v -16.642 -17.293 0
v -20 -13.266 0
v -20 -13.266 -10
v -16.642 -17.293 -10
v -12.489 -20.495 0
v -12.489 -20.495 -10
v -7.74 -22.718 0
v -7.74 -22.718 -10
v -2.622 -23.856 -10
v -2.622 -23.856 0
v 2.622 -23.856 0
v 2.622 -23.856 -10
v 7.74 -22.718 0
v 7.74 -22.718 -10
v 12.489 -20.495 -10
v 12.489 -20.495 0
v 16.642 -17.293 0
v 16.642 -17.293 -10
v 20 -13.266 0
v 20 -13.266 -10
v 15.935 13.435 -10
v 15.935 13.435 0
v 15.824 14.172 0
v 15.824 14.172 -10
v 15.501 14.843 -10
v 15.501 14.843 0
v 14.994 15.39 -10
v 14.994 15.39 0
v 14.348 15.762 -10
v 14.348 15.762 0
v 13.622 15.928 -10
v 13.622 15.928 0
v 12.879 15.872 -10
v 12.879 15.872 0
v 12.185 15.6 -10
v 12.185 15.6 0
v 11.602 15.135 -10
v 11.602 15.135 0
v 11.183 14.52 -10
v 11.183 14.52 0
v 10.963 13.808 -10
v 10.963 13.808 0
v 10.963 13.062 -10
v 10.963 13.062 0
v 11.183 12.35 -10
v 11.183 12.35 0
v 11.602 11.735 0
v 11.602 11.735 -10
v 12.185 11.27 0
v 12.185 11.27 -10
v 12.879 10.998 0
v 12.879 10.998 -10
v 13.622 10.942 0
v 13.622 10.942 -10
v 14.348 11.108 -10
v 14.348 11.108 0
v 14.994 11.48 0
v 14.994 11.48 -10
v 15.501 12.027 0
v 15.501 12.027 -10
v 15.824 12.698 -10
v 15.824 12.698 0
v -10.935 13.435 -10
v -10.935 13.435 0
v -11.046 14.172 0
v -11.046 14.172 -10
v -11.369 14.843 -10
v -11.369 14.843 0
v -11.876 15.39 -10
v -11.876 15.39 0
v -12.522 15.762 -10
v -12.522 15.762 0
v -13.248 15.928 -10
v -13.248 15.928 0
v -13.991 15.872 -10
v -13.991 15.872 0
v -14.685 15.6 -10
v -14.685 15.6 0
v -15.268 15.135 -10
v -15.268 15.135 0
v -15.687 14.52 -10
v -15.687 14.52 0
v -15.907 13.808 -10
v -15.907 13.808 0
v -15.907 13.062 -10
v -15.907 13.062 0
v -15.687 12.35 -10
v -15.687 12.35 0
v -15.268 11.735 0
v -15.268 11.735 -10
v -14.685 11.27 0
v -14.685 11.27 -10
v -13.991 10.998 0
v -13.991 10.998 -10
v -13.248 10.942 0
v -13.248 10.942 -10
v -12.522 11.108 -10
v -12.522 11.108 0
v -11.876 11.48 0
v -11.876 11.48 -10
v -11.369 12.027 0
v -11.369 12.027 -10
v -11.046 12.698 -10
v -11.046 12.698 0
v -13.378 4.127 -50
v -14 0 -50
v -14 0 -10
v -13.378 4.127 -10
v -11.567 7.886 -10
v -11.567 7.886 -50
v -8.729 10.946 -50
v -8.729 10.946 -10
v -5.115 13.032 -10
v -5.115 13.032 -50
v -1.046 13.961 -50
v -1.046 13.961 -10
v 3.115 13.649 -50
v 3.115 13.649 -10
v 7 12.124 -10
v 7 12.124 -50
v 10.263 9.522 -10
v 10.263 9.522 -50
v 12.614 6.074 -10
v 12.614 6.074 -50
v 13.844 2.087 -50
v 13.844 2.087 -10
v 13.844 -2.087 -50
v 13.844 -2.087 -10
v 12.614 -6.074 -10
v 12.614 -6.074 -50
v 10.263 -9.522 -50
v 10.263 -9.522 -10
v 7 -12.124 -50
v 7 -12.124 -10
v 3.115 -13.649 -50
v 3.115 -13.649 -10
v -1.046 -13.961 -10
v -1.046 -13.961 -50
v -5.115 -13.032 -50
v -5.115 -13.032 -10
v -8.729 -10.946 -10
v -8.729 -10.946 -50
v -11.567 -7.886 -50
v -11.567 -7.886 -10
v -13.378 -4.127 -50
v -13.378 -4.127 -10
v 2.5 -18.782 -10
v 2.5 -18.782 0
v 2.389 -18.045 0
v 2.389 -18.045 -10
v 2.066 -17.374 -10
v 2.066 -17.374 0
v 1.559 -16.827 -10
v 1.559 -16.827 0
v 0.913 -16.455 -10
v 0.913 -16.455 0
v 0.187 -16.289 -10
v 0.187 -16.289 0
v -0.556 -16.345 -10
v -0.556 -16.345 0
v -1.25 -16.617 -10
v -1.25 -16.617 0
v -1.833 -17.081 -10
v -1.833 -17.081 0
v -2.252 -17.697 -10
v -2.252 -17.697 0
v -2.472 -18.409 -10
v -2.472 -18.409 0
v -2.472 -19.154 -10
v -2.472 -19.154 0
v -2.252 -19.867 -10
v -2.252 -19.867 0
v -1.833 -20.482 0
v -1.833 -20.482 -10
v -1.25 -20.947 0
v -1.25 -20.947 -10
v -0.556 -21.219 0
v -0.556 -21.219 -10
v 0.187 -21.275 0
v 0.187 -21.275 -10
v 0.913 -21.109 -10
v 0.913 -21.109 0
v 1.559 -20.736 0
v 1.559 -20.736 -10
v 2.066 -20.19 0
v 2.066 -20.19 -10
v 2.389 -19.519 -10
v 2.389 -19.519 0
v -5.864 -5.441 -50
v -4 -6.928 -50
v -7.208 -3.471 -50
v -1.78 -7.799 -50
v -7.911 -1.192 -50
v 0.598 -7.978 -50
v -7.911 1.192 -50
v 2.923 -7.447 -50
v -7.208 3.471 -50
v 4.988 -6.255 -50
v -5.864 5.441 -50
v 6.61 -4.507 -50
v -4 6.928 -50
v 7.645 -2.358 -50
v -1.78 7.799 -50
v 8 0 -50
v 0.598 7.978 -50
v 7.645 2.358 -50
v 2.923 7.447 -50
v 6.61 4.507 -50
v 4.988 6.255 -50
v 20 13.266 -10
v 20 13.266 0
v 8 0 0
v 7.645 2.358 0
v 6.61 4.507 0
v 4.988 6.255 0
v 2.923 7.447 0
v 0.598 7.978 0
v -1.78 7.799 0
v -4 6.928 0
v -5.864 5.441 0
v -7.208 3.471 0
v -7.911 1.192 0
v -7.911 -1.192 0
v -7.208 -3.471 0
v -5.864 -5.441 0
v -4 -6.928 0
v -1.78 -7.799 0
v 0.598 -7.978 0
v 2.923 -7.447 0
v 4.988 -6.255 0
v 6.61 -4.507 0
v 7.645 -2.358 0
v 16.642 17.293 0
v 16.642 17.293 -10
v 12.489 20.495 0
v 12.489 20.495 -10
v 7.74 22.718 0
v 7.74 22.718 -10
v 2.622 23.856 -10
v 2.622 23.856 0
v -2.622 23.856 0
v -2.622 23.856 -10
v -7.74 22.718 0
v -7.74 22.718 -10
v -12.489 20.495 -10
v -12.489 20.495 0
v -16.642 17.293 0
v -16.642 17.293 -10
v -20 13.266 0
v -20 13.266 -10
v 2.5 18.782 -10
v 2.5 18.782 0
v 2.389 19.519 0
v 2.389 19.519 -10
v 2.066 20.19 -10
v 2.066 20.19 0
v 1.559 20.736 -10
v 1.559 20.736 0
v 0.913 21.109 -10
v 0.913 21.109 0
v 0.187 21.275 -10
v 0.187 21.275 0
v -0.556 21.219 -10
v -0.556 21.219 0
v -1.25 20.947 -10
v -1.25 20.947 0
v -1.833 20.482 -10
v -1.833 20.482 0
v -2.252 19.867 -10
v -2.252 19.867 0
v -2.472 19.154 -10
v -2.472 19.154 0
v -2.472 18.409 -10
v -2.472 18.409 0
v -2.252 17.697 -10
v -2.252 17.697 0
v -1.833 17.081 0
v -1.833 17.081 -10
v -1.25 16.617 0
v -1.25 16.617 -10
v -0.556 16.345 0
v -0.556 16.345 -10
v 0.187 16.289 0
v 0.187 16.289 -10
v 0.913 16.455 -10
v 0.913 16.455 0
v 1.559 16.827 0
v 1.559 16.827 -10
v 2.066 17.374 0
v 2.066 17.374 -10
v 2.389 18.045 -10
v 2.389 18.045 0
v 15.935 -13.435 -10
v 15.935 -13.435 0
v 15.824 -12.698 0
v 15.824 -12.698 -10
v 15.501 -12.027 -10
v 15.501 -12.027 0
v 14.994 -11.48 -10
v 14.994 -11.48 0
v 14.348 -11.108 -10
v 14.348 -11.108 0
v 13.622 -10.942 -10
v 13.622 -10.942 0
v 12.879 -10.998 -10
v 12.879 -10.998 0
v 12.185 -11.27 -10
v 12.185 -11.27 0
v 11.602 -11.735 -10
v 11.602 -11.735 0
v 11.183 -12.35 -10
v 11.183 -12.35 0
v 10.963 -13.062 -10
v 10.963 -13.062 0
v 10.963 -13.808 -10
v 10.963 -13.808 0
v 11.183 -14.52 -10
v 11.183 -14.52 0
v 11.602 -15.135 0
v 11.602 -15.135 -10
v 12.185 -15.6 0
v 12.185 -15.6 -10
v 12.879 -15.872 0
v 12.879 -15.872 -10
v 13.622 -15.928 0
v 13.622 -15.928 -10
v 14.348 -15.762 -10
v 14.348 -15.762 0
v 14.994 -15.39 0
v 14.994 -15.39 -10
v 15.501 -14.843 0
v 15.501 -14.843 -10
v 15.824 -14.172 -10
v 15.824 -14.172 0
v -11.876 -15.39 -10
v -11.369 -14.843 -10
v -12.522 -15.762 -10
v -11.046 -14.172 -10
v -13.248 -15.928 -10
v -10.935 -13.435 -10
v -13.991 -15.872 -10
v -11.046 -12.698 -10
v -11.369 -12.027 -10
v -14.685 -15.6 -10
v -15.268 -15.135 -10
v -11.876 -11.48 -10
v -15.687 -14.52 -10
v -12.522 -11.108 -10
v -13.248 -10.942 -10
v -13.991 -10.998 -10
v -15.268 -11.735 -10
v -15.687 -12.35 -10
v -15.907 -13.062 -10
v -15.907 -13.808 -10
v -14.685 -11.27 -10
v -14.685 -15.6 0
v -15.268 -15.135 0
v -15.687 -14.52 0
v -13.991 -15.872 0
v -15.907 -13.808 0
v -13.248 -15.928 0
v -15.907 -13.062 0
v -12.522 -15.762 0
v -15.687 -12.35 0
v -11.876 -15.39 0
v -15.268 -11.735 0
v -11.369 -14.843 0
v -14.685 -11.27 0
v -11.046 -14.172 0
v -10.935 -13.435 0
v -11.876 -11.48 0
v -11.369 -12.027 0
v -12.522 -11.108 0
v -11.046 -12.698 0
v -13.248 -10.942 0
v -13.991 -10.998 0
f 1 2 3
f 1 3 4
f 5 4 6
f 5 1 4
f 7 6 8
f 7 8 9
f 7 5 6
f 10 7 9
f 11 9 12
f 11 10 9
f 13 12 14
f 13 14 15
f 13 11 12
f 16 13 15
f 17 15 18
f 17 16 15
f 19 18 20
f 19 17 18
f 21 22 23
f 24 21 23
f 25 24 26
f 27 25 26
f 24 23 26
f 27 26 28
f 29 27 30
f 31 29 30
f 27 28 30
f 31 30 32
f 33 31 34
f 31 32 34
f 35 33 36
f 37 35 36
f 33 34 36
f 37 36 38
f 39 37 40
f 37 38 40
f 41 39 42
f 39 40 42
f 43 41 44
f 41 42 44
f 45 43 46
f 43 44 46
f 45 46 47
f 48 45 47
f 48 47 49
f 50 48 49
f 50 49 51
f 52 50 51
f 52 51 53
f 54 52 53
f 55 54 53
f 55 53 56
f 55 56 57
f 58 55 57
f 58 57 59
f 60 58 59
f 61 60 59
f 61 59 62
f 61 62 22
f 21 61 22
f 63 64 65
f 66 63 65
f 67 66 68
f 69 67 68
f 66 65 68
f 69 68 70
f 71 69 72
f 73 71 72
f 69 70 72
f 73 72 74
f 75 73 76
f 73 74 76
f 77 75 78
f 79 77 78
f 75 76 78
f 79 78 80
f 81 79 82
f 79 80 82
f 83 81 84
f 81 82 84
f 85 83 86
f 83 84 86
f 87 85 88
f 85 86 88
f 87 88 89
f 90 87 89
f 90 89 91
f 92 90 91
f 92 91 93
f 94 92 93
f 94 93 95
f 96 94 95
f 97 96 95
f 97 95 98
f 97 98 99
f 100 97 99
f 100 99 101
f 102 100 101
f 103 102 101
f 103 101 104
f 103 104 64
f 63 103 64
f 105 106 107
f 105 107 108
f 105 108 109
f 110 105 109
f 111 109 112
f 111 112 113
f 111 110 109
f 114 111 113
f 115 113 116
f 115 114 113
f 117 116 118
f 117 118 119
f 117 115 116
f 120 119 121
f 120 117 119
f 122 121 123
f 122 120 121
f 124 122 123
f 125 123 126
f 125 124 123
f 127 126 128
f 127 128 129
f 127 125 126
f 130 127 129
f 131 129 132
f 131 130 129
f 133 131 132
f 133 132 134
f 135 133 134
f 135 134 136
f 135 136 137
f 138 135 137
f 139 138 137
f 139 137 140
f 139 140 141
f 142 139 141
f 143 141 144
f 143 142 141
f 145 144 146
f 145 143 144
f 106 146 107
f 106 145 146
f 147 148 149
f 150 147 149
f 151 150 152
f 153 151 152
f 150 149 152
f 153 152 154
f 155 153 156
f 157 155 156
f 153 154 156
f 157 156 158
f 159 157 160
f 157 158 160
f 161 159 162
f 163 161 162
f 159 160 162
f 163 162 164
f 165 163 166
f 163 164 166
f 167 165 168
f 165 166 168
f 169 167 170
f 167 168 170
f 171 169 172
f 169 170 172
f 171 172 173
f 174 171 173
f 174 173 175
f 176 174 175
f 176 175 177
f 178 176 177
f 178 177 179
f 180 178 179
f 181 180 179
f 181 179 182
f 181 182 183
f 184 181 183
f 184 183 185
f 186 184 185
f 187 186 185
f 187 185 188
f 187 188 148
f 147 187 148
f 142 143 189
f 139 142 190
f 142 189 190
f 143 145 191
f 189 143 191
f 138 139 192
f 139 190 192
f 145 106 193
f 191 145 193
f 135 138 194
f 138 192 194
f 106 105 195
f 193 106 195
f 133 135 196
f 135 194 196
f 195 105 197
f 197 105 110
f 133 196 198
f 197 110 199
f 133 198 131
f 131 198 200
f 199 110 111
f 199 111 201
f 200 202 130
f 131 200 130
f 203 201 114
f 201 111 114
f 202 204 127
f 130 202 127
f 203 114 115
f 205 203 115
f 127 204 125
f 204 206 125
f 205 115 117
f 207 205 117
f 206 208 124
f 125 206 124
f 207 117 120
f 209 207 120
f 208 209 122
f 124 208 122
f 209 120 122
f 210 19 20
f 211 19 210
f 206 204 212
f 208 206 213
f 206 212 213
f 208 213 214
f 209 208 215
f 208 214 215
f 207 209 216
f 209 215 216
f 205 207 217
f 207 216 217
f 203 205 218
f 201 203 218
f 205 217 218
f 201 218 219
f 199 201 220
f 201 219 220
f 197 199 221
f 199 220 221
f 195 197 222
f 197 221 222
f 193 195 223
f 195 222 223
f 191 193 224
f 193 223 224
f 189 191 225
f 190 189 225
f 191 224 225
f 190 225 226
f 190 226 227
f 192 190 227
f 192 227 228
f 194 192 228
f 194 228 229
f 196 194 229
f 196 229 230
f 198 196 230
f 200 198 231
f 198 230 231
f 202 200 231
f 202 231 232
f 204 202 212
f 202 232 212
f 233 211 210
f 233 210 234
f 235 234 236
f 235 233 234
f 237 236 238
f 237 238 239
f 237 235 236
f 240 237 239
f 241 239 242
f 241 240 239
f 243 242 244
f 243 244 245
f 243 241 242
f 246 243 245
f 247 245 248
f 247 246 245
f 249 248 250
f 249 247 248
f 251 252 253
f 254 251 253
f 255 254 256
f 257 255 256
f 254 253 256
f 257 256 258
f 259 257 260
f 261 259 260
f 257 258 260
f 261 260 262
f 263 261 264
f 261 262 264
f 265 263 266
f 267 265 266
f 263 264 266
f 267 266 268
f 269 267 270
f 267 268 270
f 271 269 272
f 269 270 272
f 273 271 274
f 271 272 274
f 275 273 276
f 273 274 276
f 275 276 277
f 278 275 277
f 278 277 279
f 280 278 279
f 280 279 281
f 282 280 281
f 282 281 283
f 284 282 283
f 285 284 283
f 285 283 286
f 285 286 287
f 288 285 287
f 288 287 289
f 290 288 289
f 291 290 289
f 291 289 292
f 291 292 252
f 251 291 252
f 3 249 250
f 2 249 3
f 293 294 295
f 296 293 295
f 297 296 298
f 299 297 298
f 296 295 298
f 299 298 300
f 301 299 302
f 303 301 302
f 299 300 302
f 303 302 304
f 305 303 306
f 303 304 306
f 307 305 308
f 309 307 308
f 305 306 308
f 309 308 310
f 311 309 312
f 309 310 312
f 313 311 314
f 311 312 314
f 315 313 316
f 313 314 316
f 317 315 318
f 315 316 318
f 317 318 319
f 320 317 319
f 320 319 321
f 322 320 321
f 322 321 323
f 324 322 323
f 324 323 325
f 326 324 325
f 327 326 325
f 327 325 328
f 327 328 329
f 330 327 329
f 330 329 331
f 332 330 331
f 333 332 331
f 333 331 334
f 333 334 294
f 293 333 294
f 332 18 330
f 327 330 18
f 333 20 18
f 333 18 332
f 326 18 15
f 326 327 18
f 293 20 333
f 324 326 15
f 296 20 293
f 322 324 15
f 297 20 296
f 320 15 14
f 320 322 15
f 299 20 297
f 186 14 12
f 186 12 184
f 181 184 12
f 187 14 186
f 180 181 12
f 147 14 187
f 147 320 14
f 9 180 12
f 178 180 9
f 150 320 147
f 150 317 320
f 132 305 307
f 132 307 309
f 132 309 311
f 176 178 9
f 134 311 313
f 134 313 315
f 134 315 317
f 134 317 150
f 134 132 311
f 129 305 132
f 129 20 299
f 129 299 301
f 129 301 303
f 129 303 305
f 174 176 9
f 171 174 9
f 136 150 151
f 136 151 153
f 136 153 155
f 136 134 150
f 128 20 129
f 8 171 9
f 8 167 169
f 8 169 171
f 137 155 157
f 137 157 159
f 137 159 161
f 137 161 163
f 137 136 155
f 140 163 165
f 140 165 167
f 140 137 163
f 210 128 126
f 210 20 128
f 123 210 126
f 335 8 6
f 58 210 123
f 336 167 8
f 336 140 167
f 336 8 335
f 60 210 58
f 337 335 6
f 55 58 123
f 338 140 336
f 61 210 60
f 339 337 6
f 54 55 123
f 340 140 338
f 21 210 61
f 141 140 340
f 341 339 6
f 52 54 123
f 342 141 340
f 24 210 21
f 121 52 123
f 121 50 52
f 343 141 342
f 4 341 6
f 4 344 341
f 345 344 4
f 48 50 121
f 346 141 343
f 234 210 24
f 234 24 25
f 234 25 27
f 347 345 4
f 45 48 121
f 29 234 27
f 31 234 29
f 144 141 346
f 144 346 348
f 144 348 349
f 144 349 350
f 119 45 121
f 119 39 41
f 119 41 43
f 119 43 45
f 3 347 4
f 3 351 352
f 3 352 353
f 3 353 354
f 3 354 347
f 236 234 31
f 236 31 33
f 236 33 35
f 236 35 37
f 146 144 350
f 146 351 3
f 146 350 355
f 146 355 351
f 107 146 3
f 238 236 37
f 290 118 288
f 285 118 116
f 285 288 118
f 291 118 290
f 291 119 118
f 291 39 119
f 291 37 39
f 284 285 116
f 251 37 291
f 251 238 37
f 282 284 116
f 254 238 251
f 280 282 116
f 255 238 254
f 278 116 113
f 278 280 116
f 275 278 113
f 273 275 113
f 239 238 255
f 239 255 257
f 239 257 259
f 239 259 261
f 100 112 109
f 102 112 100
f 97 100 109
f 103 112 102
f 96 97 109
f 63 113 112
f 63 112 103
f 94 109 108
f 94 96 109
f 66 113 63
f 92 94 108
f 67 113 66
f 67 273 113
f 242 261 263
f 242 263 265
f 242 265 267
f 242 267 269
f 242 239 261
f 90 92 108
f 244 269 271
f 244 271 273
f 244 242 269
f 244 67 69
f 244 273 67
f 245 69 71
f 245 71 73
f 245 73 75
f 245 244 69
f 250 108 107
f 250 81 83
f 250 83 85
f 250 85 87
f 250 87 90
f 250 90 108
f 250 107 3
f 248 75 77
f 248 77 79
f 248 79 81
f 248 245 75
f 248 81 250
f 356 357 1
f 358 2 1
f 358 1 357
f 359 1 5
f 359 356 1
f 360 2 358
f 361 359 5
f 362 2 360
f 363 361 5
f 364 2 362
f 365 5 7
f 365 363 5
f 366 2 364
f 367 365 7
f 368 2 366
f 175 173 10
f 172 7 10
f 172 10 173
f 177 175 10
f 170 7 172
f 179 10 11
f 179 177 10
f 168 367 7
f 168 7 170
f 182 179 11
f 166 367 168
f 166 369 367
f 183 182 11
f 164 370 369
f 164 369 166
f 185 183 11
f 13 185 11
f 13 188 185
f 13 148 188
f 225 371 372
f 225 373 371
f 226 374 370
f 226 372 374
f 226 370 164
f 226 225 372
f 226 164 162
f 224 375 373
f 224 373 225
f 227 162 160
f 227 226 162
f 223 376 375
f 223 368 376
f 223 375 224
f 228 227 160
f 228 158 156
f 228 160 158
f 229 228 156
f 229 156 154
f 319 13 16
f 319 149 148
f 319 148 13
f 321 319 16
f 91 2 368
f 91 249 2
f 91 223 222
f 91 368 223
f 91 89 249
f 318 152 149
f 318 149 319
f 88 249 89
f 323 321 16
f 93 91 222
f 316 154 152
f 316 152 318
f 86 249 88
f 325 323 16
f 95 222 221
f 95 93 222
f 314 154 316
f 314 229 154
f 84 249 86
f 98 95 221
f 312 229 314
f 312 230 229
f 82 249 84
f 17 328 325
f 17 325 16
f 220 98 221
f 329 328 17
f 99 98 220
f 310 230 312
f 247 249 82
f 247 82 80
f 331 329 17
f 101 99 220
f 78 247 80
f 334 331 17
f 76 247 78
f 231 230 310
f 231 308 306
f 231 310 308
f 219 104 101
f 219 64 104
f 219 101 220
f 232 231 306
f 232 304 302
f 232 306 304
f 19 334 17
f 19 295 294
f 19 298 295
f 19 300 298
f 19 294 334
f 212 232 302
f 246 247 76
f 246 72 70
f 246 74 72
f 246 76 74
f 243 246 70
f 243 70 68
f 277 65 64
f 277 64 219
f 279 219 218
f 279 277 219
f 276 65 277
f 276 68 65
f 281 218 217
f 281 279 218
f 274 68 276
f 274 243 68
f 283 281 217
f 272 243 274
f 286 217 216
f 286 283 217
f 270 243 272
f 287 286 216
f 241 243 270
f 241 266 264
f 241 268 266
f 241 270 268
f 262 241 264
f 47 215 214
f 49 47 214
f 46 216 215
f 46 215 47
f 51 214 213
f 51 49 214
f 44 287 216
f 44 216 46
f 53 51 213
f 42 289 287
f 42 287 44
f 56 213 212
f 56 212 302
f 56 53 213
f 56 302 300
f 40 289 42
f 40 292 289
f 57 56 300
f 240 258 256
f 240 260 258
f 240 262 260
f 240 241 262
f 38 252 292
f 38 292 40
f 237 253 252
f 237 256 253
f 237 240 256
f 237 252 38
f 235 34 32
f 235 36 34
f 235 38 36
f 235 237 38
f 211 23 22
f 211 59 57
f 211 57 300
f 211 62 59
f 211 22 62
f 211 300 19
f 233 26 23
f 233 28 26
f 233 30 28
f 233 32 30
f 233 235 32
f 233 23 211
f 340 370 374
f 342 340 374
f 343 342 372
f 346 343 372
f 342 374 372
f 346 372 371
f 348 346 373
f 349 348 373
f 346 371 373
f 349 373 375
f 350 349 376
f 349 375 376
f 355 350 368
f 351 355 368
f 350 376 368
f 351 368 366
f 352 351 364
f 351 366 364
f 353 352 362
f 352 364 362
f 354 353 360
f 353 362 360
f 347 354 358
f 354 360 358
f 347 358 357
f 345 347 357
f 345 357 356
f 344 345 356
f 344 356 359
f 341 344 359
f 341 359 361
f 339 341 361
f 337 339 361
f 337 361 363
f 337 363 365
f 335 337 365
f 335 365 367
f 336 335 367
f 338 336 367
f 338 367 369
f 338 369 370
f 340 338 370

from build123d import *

# Parameters (mm, degrees)
SCHIZZO1_R                   = 8
SCHIZZO1_R_2                 = 2.5
ESTRUSIONE_ESTRUSIONE1_DEPTH = 50
SCHIZZO2_OUTSIDE_W           = 58.004
SCHIZZO2_OUTSIDE_H           = 66.004
SCHIZZO2_OUTSIDE_R           = 14
TAGLIO_ESTRUSIONE1_DEPTH     = 40


with BuildPart() as part:
    # Schizzo1 → Estrusione-Estrusione1 (new body)
    with BuildSketch(Plane.XY):
        with BuildLine():
            Line((20, -13.266499161), (20, 13.266499161))
            ThreePointArc((20, 13.266499161), (0, 24), (-20, 13.266499161))
            Line((-20, 13.266499161), (-20, -13.266499161))
            ThreePointArc((-20, -13.266499161), (0, -24), (20, -13.266499161))
        make_face()
        Circle(SCHIZZO1_R, mode=Mode.SUBTRACT)
        with Locations((-13.435028843, 13.435028843)):
            Circle(SCHIZZO1_R_2, mode=Mode.SUBTRACT)
        with Locations((13.435028843, 13.435028843)):
            Circle(SCHIZZO1_R_2, mode=Mode.SUBTRACT)
        with Locations((13.435028843, -13.435028843)):
            Circle(SCHIZZO1_R_2, mode=Mode.SUBTRACT)
        with Locations((-13.435028843, -13.435028843)):
            Circle(SCHIZZO1_R_2, mode=Mode.SUBTRACT)
        with Locations((0, 18.781867411)):
            Circle(SCHIZZO1_R_2, mode=Mode.SUBTRACT)
        with Locations((0, -18.781867411)):
            Circle(SCHIZZO1_R_2, mode=Mode.SUBTRACT)
    extrude(amount=-ESTRUSIONE_ESTRUSIONE1_DEPTH)

    # Schizzo2 outside → Taglio-Estrusione1 (cut)
    with BuildSketch(Plane(origin=(0, 0, -50), x_dir=(-1, 0, 0), z_dir=(0, 0, -1))):
        Rectangle(SCHIZZO2_OUTSIDE_W, SCHIZZO2_OUTSIDE_H)
        Circle(SCHIZZO2_OUTSIDE_R, mode=Mode.SUBTRACT)
    extrude(amount=-TAGLIO_ESTRUSIONE1_DEPTH, mode=Mode.SUBTRACT)


solid = part.part
